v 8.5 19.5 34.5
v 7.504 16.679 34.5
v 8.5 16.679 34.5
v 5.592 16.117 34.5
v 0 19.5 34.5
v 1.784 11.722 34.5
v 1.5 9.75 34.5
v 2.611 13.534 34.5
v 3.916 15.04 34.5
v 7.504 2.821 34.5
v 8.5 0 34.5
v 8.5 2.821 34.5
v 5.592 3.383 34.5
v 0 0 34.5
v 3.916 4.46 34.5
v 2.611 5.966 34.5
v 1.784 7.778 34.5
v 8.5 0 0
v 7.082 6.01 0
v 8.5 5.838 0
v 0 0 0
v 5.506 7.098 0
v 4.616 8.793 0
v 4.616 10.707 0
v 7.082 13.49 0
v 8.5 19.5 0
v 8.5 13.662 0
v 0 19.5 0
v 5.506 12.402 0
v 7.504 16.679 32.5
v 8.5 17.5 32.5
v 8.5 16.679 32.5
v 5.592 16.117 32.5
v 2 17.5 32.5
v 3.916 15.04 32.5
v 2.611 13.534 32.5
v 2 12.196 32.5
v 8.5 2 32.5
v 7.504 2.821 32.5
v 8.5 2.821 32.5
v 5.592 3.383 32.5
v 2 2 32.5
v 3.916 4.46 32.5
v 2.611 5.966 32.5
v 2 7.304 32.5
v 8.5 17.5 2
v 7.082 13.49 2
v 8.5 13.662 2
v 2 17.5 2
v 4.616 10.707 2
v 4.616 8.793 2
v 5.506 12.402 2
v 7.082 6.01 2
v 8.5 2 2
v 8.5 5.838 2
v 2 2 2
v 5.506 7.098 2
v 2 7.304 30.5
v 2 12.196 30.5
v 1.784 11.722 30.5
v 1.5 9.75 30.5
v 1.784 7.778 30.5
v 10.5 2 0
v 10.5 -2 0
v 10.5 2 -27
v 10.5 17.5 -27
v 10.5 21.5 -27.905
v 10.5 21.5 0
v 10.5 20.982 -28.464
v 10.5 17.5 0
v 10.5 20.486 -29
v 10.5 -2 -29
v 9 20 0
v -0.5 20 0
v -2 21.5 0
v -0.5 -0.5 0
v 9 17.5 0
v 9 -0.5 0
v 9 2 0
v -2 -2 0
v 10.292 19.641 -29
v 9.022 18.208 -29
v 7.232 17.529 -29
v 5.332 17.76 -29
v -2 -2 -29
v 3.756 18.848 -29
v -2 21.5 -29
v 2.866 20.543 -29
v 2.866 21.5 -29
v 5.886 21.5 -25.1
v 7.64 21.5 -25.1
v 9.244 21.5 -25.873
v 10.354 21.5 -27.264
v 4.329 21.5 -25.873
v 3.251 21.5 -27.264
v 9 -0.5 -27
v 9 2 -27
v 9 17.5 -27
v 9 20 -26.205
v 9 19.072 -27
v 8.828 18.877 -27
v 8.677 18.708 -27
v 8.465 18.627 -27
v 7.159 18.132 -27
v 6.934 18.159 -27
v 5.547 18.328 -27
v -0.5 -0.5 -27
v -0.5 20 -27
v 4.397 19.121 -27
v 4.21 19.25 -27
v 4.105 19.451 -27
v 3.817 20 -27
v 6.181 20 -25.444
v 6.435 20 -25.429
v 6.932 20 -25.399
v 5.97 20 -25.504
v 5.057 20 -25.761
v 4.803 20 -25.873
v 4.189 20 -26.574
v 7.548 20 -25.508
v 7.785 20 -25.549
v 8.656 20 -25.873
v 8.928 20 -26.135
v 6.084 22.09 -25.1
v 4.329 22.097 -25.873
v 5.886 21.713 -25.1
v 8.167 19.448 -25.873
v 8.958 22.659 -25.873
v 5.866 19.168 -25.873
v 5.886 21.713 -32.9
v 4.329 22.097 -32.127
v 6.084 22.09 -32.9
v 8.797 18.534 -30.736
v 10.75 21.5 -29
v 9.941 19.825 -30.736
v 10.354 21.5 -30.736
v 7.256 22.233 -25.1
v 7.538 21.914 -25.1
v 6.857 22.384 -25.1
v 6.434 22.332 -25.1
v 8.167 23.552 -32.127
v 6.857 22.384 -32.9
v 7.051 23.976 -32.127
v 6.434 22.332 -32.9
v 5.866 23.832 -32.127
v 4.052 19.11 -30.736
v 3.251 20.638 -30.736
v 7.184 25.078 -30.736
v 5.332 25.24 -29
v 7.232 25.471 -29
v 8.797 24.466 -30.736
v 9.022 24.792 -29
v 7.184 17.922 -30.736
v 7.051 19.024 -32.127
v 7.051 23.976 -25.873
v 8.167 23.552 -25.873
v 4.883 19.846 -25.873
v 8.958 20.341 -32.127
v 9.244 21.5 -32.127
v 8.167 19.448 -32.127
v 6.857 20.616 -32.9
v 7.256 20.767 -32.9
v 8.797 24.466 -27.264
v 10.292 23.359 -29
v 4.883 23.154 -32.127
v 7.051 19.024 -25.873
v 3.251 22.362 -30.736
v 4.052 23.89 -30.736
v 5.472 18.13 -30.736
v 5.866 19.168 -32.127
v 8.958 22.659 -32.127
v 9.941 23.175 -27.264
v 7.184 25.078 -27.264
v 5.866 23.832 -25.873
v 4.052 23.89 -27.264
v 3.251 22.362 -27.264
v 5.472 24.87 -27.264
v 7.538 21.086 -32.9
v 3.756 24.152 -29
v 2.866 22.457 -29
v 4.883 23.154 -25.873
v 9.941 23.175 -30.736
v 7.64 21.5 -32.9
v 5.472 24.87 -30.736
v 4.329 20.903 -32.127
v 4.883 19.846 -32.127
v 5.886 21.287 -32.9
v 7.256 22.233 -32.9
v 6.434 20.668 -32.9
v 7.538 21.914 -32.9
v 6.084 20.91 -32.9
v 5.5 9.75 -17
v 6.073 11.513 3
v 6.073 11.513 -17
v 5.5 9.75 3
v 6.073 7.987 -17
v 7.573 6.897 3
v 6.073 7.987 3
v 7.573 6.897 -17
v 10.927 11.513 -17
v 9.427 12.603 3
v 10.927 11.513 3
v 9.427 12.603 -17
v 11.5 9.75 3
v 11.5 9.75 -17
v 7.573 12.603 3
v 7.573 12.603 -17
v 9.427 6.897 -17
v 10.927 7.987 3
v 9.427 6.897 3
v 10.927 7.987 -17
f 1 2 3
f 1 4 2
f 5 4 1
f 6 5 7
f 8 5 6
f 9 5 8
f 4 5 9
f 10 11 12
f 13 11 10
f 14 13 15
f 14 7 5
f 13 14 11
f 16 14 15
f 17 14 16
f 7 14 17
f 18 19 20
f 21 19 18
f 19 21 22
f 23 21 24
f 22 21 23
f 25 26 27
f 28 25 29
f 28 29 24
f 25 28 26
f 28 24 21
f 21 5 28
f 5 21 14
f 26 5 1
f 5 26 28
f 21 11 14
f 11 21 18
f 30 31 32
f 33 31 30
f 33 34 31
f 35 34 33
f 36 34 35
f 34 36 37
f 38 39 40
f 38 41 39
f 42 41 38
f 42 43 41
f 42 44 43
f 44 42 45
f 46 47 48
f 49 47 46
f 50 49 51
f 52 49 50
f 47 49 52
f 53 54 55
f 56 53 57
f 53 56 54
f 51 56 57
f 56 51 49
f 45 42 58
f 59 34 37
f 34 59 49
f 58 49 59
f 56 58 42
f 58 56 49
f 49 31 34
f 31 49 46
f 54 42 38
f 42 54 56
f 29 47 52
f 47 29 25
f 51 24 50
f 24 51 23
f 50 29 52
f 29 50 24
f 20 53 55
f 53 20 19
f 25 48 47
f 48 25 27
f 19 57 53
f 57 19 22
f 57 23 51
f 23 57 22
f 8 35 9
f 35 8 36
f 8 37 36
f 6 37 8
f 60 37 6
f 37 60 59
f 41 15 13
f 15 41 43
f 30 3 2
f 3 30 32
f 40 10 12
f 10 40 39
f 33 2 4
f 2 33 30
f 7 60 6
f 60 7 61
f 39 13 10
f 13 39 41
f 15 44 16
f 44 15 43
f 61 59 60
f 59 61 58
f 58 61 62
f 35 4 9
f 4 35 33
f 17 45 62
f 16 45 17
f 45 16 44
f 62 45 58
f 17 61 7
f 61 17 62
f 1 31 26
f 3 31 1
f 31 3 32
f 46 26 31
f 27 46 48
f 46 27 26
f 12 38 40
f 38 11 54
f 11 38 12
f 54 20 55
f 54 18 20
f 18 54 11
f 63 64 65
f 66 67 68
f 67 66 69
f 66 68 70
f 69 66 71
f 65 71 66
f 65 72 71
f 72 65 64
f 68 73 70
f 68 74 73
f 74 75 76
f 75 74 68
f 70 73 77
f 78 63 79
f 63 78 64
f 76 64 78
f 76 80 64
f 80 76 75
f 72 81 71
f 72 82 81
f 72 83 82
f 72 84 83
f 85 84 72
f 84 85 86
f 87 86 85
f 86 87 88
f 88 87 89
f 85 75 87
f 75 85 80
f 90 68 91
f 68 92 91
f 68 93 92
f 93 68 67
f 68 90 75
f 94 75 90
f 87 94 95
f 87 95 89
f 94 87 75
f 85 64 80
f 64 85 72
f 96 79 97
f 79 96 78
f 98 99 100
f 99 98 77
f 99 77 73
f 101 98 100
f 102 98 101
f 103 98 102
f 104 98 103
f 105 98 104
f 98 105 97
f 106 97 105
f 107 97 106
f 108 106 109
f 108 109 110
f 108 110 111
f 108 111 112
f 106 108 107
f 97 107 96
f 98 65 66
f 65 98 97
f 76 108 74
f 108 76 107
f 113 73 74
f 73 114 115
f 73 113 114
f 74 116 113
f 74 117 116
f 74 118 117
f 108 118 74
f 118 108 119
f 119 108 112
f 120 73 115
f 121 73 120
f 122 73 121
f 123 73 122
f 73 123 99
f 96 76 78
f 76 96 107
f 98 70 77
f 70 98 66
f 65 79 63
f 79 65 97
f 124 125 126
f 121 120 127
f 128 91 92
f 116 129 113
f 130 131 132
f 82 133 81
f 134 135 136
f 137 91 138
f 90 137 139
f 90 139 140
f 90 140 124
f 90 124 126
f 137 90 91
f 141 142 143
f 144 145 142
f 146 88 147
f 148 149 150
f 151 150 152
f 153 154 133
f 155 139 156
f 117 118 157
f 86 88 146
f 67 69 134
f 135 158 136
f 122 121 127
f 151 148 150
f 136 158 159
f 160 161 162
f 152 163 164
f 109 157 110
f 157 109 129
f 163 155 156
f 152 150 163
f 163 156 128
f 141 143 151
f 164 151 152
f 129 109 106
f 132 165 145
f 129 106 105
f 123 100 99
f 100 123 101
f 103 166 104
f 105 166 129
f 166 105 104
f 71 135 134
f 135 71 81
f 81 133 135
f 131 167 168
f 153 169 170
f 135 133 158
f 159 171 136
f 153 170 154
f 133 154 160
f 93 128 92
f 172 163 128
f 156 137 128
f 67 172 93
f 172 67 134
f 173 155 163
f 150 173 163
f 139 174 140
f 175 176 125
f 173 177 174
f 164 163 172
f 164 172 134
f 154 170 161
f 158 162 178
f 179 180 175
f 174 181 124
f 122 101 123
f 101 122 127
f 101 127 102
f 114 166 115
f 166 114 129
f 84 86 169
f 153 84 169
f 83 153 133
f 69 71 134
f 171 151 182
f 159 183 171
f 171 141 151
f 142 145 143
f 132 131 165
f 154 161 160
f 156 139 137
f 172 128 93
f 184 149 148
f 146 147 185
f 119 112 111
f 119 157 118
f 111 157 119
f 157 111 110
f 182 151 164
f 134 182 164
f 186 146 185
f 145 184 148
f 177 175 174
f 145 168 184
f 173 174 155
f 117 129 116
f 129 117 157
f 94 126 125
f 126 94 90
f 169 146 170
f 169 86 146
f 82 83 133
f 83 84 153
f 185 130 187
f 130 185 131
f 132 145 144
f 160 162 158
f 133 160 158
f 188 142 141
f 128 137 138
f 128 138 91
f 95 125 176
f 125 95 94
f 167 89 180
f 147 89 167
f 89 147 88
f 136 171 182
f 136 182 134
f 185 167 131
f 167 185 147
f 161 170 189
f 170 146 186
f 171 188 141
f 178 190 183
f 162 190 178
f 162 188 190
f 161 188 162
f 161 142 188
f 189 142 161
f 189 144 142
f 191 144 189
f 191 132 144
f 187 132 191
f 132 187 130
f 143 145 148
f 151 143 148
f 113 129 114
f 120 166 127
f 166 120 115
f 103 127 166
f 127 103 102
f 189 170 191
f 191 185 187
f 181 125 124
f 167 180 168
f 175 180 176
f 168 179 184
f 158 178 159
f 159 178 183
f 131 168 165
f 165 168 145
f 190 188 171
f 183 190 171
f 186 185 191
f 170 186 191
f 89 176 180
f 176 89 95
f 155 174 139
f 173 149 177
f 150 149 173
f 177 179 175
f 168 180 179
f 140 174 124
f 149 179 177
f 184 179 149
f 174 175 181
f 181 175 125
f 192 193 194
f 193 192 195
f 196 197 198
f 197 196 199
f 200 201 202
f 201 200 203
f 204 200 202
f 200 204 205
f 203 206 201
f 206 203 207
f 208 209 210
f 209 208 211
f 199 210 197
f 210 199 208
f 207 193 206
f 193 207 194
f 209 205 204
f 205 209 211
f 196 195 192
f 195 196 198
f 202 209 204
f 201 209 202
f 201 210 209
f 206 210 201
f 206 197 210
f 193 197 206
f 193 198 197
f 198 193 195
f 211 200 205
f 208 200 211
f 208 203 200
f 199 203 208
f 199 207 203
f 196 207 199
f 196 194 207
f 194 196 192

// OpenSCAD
module box(w,h,d,wall) {
difference() {
    // box
    cube([w+wall*2,h+wall*2,d+wall*2]);
    translate([wall,wall,wall]) {
      // inside
      cube([w,h,d]);
    }
    
    // hole for pin 'front'
    translate ([(w+wall*2)/2,(h+wall*2)/2,-1]) {
        cylinder(r1=4,r2=4,h=6);
    }

    // hole for pin 'back'
    translate ([(w+wall*2)/2,(h+wall*2)/2,d]) {
        cylinder(r1=7,r2=7,h=6);
    }
    
    // hole for wire
    /*
    translate([-1,((h+wall*2)/2)-2,2]) {
       cube([3.5,4,3.5]);
    }
    */
};
};

module halfbox(w,h,d,wall) {
    difference() {
        box(w,h,d,wall);
        translate([((w+(wall*2))/2),-1,-1]) {
            cube([w+(wall*2),
                  h+(wall*2)+2,
                  d+(wall*2)+2]);
        }
    }
}

bw = 13;
bh = 15.5;
bd = 30.5;
bwall=2;
give = 0.5;

halfbox(bw,bh,bd,bwall);

l=25;
h=bw-0.5;

// translate([l+bwall*3,0,-10]) rotate([0,90,0]) {

    translate([0-bwall,0-bwall,0-(l+bwall*2)]) {
        difference() {
            cube([h,bh+bwall*4,l+bwall*2]);
            translate([bwall-give,bwall-give,bwall]) {
                cube([h-bwall*2+give*2,bh+bwall*2+give*2,
                    l+4]);
            };
            translate([bwall+3,bwall+bwall,bwall]) {
                cube([h-bwall*2,bh,l+4]);
            };
            
        };
            translate ([h/2+bwall+give,bh+bwall*4,0]) {
                sphere(4);
            }
    }
//}

// path of pin

translate ([(bw+bwall*2)/2,(bh+bwall*2)/2,-17]) {
   cylinder(r1=3,r2=3,h=20);
}
